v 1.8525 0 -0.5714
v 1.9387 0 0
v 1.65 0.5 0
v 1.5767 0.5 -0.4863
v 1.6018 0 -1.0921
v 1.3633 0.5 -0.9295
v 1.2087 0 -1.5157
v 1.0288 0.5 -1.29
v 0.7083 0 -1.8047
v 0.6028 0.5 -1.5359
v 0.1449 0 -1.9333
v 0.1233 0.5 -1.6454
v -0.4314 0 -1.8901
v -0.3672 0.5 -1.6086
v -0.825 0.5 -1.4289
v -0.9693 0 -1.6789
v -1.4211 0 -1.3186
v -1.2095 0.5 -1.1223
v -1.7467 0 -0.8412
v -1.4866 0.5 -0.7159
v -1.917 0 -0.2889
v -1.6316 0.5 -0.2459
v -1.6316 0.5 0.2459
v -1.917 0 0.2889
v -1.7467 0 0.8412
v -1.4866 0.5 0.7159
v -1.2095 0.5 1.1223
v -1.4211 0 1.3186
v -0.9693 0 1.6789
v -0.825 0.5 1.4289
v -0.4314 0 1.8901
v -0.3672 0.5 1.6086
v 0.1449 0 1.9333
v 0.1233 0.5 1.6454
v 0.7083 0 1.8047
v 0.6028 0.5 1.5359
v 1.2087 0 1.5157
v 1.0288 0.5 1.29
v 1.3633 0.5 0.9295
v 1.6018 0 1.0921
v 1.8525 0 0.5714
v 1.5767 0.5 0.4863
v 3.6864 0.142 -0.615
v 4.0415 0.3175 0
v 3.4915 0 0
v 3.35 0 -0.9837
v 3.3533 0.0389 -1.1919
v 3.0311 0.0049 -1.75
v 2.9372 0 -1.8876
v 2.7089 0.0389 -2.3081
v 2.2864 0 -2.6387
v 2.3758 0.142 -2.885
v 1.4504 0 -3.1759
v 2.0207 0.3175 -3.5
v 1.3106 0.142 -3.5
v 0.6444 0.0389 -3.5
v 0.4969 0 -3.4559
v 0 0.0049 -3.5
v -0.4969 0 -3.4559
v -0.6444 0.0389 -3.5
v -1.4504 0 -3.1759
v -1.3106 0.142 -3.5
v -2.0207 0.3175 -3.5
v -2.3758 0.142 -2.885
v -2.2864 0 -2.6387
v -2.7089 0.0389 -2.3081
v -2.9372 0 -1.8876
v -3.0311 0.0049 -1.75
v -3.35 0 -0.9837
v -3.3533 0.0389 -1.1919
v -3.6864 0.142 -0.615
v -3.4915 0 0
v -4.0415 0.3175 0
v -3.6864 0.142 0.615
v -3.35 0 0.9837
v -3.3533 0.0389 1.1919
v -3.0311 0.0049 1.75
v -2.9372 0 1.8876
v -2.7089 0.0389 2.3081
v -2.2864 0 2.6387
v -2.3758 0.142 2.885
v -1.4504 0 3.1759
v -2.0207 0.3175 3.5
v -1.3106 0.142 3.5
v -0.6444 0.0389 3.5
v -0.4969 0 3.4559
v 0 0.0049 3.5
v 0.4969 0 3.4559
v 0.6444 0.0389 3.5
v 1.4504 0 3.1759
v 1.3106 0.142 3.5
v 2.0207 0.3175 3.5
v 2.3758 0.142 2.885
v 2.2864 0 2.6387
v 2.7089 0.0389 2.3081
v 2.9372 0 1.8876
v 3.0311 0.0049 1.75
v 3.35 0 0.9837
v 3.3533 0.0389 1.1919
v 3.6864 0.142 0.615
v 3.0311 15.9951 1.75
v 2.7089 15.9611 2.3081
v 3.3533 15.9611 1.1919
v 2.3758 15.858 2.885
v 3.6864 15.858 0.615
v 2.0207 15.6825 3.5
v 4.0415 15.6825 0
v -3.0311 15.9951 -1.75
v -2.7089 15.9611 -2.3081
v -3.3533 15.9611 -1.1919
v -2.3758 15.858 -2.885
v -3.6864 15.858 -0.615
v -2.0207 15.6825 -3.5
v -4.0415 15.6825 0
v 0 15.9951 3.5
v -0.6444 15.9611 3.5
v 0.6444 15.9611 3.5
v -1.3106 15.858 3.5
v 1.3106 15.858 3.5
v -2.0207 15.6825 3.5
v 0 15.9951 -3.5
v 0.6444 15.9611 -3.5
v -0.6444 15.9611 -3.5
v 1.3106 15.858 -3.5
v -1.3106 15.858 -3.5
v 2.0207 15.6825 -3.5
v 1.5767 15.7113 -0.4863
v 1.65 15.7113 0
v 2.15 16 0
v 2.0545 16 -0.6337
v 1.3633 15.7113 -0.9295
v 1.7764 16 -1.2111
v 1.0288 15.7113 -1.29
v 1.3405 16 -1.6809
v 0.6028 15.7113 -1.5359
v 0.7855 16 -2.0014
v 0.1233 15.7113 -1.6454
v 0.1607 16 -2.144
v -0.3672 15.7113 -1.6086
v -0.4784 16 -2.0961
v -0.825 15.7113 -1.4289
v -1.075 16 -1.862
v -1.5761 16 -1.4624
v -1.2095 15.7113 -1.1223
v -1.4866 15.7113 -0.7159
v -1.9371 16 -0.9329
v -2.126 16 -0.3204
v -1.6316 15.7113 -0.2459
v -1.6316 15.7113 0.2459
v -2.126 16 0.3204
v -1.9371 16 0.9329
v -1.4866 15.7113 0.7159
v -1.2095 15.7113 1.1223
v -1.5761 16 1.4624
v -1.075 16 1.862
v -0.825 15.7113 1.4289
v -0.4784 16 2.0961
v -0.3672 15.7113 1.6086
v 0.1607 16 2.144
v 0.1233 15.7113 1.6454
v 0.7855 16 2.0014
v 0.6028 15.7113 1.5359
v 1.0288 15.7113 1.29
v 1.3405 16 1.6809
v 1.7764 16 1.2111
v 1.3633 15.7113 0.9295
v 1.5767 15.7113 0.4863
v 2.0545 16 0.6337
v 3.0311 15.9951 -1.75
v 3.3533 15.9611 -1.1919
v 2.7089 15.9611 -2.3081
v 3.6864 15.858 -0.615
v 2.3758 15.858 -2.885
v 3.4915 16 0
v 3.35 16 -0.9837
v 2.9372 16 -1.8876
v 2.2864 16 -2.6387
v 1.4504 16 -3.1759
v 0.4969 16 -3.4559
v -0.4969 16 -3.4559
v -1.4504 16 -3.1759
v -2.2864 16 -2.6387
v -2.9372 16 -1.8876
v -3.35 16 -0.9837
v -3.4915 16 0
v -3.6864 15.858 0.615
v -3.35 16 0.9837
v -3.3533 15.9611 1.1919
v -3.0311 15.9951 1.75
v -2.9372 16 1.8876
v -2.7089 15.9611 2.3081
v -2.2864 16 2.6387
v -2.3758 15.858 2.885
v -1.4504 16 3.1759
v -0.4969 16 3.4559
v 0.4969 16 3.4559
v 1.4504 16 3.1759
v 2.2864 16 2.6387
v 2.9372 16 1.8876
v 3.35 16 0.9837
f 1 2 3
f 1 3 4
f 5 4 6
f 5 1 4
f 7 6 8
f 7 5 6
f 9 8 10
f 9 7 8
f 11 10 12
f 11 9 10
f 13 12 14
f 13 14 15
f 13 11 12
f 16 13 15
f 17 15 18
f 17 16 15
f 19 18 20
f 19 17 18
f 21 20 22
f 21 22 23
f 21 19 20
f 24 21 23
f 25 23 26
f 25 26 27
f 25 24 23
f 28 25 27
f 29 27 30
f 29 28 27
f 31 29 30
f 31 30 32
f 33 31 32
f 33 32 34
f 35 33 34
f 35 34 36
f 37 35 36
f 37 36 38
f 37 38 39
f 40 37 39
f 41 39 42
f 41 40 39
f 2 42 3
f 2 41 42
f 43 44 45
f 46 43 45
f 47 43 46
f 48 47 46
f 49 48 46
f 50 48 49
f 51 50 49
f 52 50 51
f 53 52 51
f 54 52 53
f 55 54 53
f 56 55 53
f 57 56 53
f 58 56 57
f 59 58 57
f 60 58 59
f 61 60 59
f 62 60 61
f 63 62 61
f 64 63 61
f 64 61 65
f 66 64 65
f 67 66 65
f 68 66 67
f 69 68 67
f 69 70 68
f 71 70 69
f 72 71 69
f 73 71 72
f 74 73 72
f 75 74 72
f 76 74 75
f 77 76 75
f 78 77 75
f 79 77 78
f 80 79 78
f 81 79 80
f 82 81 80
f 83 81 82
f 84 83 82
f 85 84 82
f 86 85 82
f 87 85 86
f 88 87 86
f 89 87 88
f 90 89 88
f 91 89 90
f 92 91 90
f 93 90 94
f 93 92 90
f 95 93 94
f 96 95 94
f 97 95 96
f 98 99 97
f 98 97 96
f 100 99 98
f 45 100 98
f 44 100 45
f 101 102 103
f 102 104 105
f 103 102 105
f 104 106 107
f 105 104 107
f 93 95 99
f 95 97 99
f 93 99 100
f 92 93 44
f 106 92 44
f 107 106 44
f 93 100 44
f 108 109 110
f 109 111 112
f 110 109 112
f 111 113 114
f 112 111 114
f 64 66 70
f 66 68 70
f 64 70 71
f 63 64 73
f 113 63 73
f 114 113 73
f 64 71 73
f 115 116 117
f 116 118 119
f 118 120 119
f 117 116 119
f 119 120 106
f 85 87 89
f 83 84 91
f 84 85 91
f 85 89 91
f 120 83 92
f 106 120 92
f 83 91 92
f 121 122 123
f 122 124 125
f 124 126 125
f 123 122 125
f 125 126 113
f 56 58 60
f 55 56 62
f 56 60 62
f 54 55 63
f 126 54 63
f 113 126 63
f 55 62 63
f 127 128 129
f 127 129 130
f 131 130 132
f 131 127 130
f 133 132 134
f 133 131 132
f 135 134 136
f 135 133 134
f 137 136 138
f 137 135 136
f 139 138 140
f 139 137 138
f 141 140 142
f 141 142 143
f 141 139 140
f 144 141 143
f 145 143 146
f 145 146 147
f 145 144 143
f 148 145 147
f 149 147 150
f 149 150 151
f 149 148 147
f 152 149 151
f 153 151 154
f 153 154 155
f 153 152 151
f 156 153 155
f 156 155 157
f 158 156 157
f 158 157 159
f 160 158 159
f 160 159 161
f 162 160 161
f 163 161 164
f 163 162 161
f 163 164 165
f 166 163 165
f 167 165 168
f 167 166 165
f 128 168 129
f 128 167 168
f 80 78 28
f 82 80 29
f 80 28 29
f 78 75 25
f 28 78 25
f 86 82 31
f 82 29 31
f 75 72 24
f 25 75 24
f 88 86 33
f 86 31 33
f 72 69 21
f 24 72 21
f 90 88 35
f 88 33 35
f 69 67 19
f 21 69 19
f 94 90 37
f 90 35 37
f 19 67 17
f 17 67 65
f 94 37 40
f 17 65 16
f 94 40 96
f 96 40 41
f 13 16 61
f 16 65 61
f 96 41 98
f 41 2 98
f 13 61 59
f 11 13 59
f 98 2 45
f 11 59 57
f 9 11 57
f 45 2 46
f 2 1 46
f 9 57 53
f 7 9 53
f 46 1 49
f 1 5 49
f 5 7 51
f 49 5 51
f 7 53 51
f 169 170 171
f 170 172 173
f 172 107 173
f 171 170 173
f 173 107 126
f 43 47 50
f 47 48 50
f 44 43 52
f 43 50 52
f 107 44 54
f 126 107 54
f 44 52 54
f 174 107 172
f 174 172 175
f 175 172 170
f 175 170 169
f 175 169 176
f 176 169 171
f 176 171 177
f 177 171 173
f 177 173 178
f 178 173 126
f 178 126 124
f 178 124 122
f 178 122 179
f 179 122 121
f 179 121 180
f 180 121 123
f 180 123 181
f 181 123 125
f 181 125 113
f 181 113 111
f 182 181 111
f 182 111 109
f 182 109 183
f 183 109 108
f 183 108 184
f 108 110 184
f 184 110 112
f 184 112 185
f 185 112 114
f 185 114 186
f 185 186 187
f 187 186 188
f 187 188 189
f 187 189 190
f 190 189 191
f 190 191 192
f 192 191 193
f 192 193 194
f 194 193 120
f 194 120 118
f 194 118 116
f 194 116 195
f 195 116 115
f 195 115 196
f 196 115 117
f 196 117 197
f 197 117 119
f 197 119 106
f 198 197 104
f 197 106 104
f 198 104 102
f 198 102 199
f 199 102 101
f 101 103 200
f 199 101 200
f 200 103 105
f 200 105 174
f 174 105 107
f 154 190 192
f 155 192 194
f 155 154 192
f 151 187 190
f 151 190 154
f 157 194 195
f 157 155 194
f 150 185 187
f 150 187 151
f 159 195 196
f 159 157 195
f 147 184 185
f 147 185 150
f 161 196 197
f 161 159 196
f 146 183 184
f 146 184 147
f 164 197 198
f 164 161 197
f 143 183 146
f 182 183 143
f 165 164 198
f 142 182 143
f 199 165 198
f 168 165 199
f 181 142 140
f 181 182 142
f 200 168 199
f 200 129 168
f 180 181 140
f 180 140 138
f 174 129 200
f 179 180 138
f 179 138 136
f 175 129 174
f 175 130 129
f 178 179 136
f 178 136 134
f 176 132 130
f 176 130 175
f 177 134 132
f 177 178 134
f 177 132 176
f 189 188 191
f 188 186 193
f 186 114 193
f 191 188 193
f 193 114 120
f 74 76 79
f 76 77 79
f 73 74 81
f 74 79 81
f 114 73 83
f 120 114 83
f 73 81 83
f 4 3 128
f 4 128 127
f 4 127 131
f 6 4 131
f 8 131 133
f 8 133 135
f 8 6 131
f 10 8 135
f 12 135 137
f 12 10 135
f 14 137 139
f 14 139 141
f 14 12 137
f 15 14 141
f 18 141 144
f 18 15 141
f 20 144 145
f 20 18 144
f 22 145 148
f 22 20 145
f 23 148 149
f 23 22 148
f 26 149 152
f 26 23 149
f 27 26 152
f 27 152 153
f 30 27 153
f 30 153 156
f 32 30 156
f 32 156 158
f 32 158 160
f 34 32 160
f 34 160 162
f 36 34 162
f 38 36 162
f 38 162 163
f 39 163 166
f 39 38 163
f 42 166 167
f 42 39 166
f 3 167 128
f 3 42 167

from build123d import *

# Parameters (mm, degrees)
SKETCH1_R             = 4.041451884
SKETCH1_R_2           = 1.65
BOSS_EXTRUDE1_DEPTH   = 16
CHAMFER1_SIZE         = 0.55
CHAMFER1_SIZE2        = 0.317542648
CHAMFER2_SIZE         = 0.55
CHAMFER2_SIZE2        = 0.317542648
SKETCH2_OUTSIDE_W     = 14.014
SKETCH2_OUTSIDE_H     = 14.014
CUT_EXTRUDE1_DEPTH    = 17
CHAMFER3_SIZE         = 0.5
CHAMFER3_SIZE2        = 0.288675135
CHAMFER3_PART_2_SIZE  = 0.5
CHAMFER3_PART_2_SIZE2 = 0.288675135


with BuildPart() as part:
    # Sketch1 → Boss-Extrude1 (new body)
    with BuildSketch(Plane(origin=(0, 0, 0), x_dir=(1, 0, 0), z_dir=(0, 1, 0))):
        Circle(SKETCH1_R)
        Circle(SKETCH1_R_2, mode=Mode.SUBTRACT)
    extrude(amount=BOSS_EXTRUDE1_DEPTH)

    # Chamfer1
    chamfer1_edges = [part.edges().sort_by_distance(p)[0] for p in [
        (-4.041451884, 16, 0),
    ]]
    chamfer1_side = [part.faces().sort_by_distance(p)[0] for p in [
        (-3.927142363, 16, 0),
    ]]
    chamfer(chamfer1_edges, length=CHAMFER1_SIZE, length2=CHAMFER1_SIZE2, reference=chamfer1_side[0])

    # Chamfer2
    chamfer2_edges = [part.edges().sort_by_distance(p)[0] for p in [
        (-4.041451884, 0, 0),
    ]]
    chamfer2_side = [part.faces().sort_by_distance(p)[0] for p in [
        (-3.927142363, 0, 0),
    ]]
    chamfer(chamfer2_edges, length=CHAMFER2_SIZE, length2=CHAMFER2_SIZE2, reference=chamfer2_side[0])

    # Sketch2 outside → Cut-Extrude1 (cut, through all)
    with BuildSketch(Plane.XZ):
        Rectangle(SKETCH2_OUTSIDE_W, SKETCH2_OUTSIDE_H)
        Polygon((4.041451884, 0), (2.020725942, -3.5), (-2.020725942, -3.5), (-4.041451884, 0), (-2.020725942, 3.5), (2.020725942, 3.5), align=None, mode=Mode.SUBTRACT)
    extrude(amount=-CUT_EXTRUDE1_DEPTH, mode=Mode.SUBTRACT)

    # Chamfer3
    chamfer3_edges = [part.edges().sort_by_distance(p)[0] for p in [
        (-1.65, 0, 0),
    ]]
    chamfer3_side = [part.faces().sort_by_distance(p)[0] for p in [
        (-1.65, 8, 0),
    ]]
    chamfer(chamfer3_edges, length=CHAMFER3_SIZE, length2=CHAMFER3_SIZE2, reference=chamfer3_side[0])

    # Chamfer3 part 2
    chamfer3_part_2_edges = [part.edges().sort_by_distance(p)[0] for p in [
        (-1.65, 16, 0),
    ]]
    chamfer3_part_2_side = [part.faces().sort_by_distance(p)[0] for p in [
        (-3.392698712, 16, 0),
    ]]
    chamfer(chamfer3_part_2_edges, length=CHAMFER3_PART_2_SIZE, length2=CHAMFER3_PART_2_SIZE2, reference=chamfer3_part_2_side[0])


solid = part.part
